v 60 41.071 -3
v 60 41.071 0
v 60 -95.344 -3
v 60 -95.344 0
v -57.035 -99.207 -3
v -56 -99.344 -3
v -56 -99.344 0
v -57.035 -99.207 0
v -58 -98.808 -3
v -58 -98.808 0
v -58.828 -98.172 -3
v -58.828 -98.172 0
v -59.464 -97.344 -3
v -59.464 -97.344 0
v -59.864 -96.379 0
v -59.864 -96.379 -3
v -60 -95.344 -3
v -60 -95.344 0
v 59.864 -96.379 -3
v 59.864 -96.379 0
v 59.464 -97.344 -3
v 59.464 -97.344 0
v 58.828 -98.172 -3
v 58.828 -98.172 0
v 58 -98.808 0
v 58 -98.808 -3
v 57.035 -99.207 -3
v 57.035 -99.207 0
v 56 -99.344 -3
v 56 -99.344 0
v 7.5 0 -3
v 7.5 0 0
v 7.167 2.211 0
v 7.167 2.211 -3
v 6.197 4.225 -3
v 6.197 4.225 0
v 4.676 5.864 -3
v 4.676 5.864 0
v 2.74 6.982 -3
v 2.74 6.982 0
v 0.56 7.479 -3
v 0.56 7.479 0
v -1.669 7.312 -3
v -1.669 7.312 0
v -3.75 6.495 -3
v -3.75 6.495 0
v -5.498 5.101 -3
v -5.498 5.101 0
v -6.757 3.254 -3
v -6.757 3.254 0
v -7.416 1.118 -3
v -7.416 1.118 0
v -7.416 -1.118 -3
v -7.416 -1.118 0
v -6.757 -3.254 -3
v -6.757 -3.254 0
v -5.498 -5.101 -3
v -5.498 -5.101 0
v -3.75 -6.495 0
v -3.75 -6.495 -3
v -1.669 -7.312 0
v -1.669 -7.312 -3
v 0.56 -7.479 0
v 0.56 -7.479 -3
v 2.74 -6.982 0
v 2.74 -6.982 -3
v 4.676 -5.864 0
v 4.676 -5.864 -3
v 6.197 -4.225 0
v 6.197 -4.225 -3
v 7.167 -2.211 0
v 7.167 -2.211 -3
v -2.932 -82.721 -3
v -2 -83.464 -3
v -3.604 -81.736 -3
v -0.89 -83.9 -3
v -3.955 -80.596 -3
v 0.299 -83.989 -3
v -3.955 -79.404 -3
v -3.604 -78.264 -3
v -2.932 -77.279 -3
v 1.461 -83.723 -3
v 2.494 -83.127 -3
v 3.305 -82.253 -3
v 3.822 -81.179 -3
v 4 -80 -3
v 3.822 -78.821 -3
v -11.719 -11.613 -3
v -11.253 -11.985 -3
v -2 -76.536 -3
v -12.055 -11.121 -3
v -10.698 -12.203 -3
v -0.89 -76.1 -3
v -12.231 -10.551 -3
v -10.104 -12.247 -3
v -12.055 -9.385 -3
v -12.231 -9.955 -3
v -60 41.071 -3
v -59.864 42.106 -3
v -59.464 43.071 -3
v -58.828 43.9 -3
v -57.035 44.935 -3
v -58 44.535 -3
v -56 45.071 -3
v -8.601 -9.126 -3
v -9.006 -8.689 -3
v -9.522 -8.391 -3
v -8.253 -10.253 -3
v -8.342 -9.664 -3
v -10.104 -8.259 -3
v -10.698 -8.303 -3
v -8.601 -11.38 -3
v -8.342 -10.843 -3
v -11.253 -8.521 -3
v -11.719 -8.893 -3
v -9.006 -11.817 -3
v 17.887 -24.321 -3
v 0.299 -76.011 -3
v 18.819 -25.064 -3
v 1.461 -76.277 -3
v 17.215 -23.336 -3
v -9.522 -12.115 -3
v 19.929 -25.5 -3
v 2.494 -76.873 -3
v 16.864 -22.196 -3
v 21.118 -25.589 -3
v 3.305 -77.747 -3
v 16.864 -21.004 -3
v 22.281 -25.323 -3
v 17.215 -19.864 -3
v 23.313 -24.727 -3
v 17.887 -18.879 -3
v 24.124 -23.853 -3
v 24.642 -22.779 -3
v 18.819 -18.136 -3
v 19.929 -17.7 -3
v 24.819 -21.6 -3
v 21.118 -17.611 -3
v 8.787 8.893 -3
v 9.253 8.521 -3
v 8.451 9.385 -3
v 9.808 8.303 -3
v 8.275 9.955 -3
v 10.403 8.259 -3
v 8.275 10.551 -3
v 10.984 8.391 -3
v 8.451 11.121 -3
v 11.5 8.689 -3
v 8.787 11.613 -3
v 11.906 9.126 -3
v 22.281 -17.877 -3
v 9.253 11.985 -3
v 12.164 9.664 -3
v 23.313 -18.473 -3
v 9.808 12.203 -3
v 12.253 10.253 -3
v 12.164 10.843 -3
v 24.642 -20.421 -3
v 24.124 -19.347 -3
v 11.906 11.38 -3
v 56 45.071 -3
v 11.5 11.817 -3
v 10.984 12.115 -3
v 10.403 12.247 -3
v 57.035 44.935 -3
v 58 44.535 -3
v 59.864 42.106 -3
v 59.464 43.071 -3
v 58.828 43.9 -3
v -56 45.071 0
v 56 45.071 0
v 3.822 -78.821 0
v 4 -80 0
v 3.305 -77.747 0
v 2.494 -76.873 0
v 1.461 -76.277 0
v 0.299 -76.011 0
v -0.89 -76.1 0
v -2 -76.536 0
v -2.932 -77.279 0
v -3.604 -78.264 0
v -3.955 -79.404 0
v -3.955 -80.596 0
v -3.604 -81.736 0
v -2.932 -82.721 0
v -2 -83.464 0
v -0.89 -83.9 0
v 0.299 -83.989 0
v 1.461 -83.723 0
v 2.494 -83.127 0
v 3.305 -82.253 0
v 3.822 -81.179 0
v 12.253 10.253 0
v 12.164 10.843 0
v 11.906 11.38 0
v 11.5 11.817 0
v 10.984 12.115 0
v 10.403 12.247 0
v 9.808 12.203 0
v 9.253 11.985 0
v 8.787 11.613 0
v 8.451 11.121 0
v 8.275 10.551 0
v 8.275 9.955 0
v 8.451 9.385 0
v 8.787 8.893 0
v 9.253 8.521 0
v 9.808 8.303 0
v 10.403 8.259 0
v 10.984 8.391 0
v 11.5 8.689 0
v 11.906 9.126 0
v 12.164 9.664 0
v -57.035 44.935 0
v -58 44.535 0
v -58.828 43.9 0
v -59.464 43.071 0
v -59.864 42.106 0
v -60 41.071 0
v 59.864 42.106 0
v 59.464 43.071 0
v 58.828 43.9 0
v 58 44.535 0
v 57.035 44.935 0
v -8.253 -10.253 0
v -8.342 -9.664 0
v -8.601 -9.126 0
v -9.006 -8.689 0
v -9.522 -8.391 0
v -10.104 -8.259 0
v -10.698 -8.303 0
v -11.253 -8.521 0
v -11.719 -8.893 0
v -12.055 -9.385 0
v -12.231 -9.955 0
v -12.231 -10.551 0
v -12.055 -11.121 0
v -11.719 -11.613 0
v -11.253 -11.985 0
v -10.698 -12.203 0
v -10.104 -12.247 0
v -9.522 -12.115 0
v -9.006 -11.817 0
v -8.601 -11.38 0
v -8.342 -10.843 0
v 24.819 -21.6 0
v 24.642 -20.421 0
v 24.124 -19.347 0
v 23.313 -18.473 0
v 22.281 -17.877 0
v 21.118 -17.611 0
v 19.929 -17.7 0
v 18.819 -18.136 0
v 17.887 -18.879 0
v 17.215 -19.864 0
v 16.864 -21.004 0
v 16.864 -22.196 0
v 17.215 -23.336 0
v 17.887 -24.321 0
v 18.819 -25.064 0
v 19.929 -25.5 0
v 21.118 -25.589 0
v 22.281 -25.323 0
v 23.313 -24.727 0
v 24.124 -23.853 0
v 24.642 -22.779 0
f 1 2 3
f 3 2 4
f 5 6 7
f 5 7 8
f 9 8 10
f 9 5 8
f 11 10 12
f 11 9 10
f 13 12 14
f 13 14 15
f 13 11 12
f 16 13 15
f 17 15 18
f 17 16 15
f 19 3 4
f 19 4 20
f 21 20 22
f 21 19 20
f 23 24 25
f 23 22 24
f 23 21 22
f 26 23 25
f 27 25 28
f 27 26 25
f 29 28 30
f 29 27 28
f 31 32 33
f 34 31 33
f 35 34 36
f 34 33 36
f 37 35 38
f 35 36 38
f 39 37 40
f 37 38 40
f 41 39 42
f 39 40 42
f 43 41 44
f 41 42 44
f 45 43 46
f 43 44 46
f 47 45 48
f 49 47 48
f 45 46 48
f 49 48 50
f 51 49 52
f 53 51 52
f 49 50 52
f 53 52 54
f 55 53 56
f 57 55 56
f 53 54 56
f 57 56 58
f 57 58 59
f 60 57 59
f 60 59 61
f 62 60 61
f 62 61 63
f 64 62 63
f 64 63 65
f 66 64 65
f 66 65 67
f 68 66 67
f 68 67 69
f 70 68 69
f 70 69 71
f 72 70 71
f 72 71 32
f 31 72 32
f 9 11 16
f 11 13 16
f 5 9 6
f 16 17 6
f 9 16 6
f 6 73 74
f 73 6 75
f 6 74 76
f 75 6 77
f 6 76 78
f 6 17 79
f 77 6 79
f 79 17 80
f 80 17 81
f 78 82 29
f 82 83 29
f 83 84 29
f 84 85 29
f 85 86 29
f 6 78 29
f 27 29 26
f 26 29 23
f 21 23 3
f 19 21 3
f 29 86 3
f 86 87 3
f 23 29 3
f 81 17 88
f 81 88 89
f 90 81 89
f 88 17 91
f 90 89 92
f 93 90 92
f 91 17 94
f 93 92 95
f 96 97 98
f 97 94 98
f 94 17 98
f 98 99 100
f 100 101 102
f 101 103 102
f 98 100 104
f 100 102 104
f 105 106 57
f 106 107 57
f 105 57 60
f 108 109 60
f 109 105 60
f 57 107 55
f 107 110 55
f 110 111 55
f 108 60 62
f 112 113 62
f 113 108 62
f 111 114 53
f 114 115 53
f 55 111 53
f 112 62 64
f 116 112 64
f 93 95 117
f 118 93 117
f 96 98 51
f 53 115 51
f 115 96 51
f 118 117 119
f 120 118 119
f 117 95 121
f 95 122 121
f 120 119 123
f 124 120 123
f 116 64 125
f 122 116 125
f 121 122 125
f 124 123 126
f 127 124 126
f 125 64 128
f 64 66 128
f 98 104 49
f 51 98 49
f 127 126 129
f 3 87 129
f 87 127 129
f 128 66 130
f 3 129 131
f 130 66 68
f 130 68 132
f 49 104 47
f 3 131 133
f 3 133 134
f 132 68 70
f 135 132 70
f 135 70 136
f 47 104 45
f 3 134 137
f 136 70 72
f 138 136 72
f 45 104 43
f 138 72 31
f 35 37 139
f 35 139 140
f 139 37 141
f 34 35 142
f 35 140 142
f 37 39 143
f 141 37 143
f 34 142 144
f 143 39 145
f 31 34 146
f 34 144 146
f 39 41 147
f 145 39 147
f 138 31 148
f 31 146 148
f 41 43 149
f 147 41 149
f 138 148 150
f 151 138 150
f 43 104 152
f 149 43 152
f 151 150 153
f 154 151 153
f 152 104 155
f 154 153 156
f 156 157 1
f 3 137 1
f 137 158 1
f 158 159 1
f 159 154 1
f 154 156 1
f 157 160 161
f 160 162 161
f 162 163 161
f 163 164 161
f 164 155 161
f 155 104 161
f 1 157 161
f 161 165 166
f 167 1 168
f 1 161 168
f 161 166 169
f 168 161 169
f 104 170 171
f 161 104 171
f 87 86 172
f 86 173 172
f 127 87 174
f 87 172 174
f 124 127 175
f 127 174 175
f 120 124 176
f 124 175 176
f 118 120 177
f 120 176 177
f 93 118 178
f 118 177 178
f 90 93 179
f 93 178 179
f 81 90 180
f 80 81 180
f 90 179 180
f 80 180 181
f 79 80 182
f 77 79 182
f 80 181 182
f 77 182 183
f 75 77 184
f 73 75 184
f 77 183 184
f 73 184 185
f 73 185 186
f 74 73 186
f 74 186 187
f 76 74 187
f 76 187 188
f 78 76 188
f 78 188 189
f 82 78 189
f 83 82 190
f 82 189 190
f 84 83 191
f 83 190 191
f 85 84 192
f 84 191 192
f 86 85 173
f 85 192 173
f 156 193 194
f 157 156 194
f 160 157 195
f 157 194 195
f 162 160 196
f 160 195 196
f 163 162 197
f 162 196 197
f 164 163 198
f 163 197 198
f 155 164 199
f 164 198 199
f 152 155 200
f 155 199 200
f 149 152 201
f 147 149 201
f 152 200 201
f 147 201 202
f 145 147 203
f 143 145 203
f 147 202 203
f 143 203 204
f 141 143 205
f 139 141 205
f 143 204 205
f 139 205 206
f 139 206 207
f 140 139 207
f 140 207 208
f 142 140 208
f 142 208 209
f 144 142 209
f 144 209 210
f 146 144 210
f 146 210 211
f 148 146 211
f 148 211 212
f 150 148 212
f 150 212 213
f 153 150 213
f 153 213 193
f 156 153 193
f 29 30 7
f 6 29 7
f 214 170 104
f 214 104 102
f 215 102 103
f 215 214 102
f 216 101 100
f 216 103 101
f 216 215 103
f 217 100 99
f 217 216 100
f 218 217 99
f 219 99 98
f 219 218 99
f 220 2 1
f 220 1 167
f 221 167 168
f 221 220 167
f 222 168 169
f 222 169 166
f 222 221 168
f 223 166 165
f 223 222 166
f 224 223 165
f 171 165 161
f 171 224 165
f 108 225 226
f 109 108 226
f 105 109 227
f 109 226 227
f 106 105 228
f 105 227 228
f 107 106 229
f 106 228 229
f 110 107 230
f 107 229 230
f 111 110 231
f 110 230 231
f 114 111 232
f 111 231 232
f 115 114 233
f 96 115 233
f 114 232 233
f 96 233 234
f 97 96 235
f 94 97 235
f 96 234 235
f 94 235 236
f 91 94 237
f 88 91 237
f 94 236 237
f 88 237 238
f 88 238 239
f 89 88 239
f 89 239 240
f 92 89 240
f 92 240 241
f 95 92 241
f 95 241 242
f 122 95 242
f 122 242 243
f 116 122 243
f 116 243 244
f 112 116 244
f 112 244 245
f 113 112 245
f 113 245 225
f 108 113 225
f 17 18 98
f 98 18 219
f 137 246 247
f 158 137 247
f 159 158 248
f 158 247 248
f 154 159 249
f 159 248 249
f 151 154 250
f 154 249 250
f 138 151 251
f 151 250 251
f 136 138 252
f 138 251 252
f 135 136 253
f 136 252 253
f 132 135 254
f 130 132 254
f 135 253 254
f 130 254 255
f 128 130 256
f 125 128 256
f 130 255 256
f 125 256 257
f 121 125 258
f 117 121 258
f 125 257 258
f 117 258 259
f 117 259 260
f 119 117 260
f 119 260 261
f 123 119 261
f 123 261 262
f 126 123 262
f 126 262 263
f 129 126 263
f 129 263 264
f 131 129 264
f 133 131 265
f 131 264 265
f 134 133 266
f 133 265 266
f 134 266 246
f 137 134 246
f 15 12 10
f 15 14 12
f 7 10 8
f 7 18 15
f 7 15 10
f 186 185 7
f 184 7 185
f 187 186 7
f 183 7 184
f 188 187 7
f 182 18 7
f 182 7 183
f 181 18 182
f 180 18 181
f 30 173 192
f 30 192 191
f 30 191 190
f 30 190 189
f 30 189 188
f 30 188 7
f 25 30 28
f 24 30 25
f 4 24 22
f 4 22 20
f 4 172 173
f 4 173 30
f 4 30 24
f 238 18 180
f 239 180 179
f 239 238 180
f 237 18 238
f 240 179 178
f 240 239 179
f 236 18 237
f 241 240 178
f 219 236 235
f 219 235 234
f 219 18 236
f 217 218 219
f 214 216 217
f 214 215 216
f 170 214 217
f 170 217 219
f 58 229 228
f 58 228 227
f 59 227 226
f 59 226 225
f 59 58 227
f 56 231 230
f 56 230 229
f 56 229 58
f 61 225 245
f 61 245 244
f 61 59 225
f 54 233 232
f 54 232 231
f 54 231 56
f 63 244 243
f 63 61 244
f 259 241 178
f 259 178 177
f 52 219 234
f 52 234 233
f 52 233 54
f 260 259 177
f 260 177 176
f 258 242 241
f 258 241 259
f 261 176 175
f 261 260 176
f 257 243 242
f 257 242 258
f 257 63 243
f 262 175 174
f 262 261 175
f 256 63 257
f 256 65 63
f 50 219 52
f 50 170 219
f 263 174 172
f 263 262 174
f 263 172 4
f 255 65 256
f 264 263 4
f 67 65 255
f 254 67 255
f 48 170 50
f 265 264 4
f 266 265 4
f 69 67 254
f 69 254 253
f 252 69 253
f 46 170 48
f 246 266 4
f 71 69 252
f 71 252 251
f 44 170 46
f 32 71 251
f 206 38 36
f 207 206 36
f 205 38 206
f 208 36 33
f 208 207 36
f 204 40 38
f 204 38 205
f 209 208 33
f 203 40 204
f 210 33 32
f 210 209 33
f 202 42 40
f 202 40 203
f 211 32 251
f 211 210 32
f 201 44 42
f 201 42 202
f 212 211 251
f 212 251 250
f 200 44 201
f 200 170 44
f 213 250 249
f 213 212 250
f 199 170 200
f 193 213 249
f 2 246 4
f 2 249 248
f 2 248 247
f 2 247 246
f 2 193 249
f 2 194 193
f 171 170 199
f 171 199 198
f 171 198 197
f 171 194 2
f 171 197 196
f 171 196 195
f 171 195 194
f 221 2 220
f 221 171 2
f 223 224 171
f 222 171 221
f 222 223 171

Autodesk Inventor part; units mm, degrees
ref_plane "YZ Plane" through (0, 0, 0) normal (1, 0, 0) x (0, 1, 0)
ref_plane "XZ Plane" through (0, 0, 0) normal (0, 1, 0) x (-1, 0, 0)
ref_plane "XY Plane" through (0, 0, 0) normal (0, 0, 1) x (1, 0, 0)
sketch "スケッチ1" plane through (0, 0, 0) normal (0, 0, 1) x (1, 0, 0)
  circle A0 centre (0, 0) radius 21.2
  circle A1 centre (0, 0) radius 7.5
  circle A2 centre (0, 0) radius 30
  circle A3 centre (20.819222, -21.6) radius 22.5
  circle A4 centre (20.819222, -21.6) radius 14
  circle A5 centre (20.819222, -21.6) radius 62
  circle A6 centre (0, -80) radius 48
  circle A7 centre (0, -80) radius 50
  circle A8 centre (20.819222, -21.6) radius 4
  circle A9 centre (0, -80) radius 4
  dimension "d2" = 60
  dimension "d4" = 124
  dimension "d0" = 42.4
  dimension "d1" = 15
  dimension "d3" = 28
  dimension "d5" = 100
  dimension "d23" = 8
  dimension "d41" = 8
sketch "スケッチ2" plane through (0, 0, 0) normal (0, 0, 1) x (1, 0, 0)
  line L0 (0, 0) -> (24.501973, 0) construction
  line L1 (0, 0) -> (12.5, 0) construction
  line L2 (0, 0) -> (10.253048, 10.253048)
  line L3 (0, 0) -> (14.5, 0) construction
  line L4 (10.253048, 10.253048) -> (-10.253048, -10.253048)
  circle A0 centre (10.253048, 10.253048) radius 2
  circle A1 centre (-10.253048, -10.253048) radius 2
  circle A2 centre (0, 0) radius 7.5
  line L5 (0, 0) -> (28.190779, 10.260604)
  line L6 (0, 0) -> (30, 0) construction
  line L7 (0, 0) -> (-28.190779, 10.260604)
  line L8 (0, 0) -> (30, 0) construction
  circle A3 centre (-28.190779, 10.260604) radius 2.5
  line L9 (0, 0) -> (0, 30)
  circle A4 centre (0, 30) radius 2.5
  circle A5 centre (28.190779, 10.260604) radius 2.5
  dimension "d9" = 14.5
  dimension "d10" = 45
  dimension "d11" = 29
  dimension "d12" = 4
  dimension "d13" = 4
  dimension "d14" = 15
  dimension "d15" = 30
  dimension "d16" = 20
  dimension "d17" = 30
  dimension "d18" = 160
  dimension "d19" = 5
  dimension "d20" = 30
  dimension "d21" = 5
  dimension "d22" = 5
sketch "スケッチ3" plane through (0, 0, 0) normal (0, 0, 1) x (1, 0, 0)
  line L0 (60, -99.343647) -> (-60, -99.343647)
  line L1 (-60, -99.343647) -> (-60, 99.343647)
  line L2 (-60, 99.343647) -> (60, 99.343647)
  line L3 (60, 99.343647) -> (60, -99.343647)
  line L4 (60, -99.343647) -> (-60, 99.343647) construction
  line L5 (-60, -99.343647) -> (60, 99.343647) construction
  point P0 (0, 0)
  dimension "d25" = 120
extrude "押し出し1" add sketch "スケッチ3" against normal blind 3
sketch "スケッチ4" plane through (0, 0, 0) normal (0, 0, 1) x (1, 0, 0)
  line L0 (0, 45.071117) -> (68.359536, 45.071117)
  line L1 (68.359536, 45.071117) -> (-74.382402, 45.071117)
  line L2 (-74.382402, 45.071117) -> (108.165644, 45.071117)
  line L3 (108.165644, 45.071117) -> (108.165644, 129.415375)
  line L4 (108.165644, 129.415375) -> (-74.382402, 129.415375)
  line L5 (-74.382402, 129.415375) -> (-74.382402, 45.071117)
  point P0 (0, 0)
extrude "押し出し4" cut sketch "スケッチ4" against normal blind 10
fillet "フィレット1" radius 4 4 edges at (-60, 45.0711, -1.5) (60, 45.0711, -1.5) (-60, -99.3436, -1.5) (60, -99.3436, -1.5)
extrude "押し出し7" cut sketch "スケッチ1" against normal blind 10 contours A8 A2 | A2 A8 | A9 A5 | A5 A9
extrude "押し出し9" cut sketch "スケッチ2" against normal blind 4 contours L9 A2 L2 | L5 A2 L4 | L2 A2 L5 | L4 A2 L7 | L7 A2 L9 | A0 | A1
equation "\"d46\" = d12"
properties part number "板"
